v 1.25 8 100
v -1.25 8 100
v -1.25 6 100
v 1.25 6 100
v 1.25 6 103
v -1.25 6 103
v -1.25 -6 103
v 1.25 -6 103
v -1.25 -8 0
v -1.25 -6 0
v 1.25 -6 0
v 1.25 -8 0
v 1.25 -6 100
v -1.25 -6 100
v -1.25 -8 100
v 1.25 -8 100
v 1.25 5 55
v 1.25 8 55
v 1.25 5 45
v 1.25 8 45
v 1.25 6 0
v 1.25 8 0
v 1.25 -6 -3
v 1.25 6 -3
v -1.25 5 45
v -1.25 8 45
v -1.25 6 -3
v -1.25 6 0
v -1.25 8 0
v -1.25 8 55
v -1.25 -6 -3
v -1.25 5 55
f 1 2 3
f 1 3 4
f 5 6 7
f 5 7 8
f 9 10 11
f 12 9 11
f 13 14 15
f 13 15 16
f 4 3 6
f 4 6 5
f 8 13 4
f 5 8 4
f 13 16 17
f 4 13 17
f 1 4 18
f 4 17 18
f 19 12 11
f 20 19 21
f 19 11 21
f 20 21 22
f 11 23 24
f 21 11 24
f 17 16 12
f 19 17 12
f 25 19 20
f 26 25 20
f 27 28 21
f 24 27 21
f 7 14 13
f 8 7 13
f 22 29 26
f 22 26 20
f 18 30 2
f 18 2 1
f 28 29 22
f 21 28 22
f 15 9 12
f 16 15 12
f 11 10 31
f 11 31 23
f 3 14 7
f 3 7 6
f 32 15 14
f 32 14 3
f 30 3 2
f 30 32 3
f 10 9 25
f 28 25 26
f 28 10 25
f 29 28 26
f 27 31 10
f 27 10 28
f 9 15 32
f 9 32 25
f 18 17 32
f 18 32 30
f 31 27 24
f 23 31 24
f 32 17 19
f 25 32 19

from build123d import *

# Parameters (mm, degrees)
SKETCH1_W           = 2.5
SKETCH1_H           = 16
BOSS_EXTRUDE1_DEPTH = 100
SKETCH1_3_W         = 2.5
SKETCH1_3_H         = 12
BOSS_EXTRUDE2_DEPTH = 3
SKETCH2_W           = 10
SKETCH2_H           = 3
CUT_EXTRUDE1_DEPTH  = 10


with BuildPart() as part:
    # Sketch1 → Boss-Extrude1 (new body)
    with BuildSketch(Plane.XY):
        Rectangle(SKETCH1_W, SKETCH1_H)
    extrude(amount=BOSS_EXTRUDE1_DEPTH)

    # Sketch1<3> → Boss-Extrude2 (add)
    with BuildSketch(Plane.XY):
        Rectangle(SKETCH1_3_W, SKETCH1_3_H)
    boss_extrude2 = extrude(amount=-BOSS_EXTRUDE2_DEPTH)

    # Mirror1: Boss-Extrude2 across plane
    add(boss_extrude2.mirror(Plane(origin=(0, 0, 50), x_dir=(1, 0, 0), z_dir=(0, 0, -1))))

    # Sketch2 → Cut-Extrude1 (cut)
    with BuildSketch(Plane(origin=(1.25, 0, 0), x_dir=(0, 0, -1), z_dir=(1, 0, 0))):
        with Locations((-50, 6.5)):
            Rectangle(SKETCH2_W, SKETCH2_H)
    extrude(amount=-CUT_EXTRUDE1_DEPTH, mode=Mode.SUBTRACT)


solid = part.part
